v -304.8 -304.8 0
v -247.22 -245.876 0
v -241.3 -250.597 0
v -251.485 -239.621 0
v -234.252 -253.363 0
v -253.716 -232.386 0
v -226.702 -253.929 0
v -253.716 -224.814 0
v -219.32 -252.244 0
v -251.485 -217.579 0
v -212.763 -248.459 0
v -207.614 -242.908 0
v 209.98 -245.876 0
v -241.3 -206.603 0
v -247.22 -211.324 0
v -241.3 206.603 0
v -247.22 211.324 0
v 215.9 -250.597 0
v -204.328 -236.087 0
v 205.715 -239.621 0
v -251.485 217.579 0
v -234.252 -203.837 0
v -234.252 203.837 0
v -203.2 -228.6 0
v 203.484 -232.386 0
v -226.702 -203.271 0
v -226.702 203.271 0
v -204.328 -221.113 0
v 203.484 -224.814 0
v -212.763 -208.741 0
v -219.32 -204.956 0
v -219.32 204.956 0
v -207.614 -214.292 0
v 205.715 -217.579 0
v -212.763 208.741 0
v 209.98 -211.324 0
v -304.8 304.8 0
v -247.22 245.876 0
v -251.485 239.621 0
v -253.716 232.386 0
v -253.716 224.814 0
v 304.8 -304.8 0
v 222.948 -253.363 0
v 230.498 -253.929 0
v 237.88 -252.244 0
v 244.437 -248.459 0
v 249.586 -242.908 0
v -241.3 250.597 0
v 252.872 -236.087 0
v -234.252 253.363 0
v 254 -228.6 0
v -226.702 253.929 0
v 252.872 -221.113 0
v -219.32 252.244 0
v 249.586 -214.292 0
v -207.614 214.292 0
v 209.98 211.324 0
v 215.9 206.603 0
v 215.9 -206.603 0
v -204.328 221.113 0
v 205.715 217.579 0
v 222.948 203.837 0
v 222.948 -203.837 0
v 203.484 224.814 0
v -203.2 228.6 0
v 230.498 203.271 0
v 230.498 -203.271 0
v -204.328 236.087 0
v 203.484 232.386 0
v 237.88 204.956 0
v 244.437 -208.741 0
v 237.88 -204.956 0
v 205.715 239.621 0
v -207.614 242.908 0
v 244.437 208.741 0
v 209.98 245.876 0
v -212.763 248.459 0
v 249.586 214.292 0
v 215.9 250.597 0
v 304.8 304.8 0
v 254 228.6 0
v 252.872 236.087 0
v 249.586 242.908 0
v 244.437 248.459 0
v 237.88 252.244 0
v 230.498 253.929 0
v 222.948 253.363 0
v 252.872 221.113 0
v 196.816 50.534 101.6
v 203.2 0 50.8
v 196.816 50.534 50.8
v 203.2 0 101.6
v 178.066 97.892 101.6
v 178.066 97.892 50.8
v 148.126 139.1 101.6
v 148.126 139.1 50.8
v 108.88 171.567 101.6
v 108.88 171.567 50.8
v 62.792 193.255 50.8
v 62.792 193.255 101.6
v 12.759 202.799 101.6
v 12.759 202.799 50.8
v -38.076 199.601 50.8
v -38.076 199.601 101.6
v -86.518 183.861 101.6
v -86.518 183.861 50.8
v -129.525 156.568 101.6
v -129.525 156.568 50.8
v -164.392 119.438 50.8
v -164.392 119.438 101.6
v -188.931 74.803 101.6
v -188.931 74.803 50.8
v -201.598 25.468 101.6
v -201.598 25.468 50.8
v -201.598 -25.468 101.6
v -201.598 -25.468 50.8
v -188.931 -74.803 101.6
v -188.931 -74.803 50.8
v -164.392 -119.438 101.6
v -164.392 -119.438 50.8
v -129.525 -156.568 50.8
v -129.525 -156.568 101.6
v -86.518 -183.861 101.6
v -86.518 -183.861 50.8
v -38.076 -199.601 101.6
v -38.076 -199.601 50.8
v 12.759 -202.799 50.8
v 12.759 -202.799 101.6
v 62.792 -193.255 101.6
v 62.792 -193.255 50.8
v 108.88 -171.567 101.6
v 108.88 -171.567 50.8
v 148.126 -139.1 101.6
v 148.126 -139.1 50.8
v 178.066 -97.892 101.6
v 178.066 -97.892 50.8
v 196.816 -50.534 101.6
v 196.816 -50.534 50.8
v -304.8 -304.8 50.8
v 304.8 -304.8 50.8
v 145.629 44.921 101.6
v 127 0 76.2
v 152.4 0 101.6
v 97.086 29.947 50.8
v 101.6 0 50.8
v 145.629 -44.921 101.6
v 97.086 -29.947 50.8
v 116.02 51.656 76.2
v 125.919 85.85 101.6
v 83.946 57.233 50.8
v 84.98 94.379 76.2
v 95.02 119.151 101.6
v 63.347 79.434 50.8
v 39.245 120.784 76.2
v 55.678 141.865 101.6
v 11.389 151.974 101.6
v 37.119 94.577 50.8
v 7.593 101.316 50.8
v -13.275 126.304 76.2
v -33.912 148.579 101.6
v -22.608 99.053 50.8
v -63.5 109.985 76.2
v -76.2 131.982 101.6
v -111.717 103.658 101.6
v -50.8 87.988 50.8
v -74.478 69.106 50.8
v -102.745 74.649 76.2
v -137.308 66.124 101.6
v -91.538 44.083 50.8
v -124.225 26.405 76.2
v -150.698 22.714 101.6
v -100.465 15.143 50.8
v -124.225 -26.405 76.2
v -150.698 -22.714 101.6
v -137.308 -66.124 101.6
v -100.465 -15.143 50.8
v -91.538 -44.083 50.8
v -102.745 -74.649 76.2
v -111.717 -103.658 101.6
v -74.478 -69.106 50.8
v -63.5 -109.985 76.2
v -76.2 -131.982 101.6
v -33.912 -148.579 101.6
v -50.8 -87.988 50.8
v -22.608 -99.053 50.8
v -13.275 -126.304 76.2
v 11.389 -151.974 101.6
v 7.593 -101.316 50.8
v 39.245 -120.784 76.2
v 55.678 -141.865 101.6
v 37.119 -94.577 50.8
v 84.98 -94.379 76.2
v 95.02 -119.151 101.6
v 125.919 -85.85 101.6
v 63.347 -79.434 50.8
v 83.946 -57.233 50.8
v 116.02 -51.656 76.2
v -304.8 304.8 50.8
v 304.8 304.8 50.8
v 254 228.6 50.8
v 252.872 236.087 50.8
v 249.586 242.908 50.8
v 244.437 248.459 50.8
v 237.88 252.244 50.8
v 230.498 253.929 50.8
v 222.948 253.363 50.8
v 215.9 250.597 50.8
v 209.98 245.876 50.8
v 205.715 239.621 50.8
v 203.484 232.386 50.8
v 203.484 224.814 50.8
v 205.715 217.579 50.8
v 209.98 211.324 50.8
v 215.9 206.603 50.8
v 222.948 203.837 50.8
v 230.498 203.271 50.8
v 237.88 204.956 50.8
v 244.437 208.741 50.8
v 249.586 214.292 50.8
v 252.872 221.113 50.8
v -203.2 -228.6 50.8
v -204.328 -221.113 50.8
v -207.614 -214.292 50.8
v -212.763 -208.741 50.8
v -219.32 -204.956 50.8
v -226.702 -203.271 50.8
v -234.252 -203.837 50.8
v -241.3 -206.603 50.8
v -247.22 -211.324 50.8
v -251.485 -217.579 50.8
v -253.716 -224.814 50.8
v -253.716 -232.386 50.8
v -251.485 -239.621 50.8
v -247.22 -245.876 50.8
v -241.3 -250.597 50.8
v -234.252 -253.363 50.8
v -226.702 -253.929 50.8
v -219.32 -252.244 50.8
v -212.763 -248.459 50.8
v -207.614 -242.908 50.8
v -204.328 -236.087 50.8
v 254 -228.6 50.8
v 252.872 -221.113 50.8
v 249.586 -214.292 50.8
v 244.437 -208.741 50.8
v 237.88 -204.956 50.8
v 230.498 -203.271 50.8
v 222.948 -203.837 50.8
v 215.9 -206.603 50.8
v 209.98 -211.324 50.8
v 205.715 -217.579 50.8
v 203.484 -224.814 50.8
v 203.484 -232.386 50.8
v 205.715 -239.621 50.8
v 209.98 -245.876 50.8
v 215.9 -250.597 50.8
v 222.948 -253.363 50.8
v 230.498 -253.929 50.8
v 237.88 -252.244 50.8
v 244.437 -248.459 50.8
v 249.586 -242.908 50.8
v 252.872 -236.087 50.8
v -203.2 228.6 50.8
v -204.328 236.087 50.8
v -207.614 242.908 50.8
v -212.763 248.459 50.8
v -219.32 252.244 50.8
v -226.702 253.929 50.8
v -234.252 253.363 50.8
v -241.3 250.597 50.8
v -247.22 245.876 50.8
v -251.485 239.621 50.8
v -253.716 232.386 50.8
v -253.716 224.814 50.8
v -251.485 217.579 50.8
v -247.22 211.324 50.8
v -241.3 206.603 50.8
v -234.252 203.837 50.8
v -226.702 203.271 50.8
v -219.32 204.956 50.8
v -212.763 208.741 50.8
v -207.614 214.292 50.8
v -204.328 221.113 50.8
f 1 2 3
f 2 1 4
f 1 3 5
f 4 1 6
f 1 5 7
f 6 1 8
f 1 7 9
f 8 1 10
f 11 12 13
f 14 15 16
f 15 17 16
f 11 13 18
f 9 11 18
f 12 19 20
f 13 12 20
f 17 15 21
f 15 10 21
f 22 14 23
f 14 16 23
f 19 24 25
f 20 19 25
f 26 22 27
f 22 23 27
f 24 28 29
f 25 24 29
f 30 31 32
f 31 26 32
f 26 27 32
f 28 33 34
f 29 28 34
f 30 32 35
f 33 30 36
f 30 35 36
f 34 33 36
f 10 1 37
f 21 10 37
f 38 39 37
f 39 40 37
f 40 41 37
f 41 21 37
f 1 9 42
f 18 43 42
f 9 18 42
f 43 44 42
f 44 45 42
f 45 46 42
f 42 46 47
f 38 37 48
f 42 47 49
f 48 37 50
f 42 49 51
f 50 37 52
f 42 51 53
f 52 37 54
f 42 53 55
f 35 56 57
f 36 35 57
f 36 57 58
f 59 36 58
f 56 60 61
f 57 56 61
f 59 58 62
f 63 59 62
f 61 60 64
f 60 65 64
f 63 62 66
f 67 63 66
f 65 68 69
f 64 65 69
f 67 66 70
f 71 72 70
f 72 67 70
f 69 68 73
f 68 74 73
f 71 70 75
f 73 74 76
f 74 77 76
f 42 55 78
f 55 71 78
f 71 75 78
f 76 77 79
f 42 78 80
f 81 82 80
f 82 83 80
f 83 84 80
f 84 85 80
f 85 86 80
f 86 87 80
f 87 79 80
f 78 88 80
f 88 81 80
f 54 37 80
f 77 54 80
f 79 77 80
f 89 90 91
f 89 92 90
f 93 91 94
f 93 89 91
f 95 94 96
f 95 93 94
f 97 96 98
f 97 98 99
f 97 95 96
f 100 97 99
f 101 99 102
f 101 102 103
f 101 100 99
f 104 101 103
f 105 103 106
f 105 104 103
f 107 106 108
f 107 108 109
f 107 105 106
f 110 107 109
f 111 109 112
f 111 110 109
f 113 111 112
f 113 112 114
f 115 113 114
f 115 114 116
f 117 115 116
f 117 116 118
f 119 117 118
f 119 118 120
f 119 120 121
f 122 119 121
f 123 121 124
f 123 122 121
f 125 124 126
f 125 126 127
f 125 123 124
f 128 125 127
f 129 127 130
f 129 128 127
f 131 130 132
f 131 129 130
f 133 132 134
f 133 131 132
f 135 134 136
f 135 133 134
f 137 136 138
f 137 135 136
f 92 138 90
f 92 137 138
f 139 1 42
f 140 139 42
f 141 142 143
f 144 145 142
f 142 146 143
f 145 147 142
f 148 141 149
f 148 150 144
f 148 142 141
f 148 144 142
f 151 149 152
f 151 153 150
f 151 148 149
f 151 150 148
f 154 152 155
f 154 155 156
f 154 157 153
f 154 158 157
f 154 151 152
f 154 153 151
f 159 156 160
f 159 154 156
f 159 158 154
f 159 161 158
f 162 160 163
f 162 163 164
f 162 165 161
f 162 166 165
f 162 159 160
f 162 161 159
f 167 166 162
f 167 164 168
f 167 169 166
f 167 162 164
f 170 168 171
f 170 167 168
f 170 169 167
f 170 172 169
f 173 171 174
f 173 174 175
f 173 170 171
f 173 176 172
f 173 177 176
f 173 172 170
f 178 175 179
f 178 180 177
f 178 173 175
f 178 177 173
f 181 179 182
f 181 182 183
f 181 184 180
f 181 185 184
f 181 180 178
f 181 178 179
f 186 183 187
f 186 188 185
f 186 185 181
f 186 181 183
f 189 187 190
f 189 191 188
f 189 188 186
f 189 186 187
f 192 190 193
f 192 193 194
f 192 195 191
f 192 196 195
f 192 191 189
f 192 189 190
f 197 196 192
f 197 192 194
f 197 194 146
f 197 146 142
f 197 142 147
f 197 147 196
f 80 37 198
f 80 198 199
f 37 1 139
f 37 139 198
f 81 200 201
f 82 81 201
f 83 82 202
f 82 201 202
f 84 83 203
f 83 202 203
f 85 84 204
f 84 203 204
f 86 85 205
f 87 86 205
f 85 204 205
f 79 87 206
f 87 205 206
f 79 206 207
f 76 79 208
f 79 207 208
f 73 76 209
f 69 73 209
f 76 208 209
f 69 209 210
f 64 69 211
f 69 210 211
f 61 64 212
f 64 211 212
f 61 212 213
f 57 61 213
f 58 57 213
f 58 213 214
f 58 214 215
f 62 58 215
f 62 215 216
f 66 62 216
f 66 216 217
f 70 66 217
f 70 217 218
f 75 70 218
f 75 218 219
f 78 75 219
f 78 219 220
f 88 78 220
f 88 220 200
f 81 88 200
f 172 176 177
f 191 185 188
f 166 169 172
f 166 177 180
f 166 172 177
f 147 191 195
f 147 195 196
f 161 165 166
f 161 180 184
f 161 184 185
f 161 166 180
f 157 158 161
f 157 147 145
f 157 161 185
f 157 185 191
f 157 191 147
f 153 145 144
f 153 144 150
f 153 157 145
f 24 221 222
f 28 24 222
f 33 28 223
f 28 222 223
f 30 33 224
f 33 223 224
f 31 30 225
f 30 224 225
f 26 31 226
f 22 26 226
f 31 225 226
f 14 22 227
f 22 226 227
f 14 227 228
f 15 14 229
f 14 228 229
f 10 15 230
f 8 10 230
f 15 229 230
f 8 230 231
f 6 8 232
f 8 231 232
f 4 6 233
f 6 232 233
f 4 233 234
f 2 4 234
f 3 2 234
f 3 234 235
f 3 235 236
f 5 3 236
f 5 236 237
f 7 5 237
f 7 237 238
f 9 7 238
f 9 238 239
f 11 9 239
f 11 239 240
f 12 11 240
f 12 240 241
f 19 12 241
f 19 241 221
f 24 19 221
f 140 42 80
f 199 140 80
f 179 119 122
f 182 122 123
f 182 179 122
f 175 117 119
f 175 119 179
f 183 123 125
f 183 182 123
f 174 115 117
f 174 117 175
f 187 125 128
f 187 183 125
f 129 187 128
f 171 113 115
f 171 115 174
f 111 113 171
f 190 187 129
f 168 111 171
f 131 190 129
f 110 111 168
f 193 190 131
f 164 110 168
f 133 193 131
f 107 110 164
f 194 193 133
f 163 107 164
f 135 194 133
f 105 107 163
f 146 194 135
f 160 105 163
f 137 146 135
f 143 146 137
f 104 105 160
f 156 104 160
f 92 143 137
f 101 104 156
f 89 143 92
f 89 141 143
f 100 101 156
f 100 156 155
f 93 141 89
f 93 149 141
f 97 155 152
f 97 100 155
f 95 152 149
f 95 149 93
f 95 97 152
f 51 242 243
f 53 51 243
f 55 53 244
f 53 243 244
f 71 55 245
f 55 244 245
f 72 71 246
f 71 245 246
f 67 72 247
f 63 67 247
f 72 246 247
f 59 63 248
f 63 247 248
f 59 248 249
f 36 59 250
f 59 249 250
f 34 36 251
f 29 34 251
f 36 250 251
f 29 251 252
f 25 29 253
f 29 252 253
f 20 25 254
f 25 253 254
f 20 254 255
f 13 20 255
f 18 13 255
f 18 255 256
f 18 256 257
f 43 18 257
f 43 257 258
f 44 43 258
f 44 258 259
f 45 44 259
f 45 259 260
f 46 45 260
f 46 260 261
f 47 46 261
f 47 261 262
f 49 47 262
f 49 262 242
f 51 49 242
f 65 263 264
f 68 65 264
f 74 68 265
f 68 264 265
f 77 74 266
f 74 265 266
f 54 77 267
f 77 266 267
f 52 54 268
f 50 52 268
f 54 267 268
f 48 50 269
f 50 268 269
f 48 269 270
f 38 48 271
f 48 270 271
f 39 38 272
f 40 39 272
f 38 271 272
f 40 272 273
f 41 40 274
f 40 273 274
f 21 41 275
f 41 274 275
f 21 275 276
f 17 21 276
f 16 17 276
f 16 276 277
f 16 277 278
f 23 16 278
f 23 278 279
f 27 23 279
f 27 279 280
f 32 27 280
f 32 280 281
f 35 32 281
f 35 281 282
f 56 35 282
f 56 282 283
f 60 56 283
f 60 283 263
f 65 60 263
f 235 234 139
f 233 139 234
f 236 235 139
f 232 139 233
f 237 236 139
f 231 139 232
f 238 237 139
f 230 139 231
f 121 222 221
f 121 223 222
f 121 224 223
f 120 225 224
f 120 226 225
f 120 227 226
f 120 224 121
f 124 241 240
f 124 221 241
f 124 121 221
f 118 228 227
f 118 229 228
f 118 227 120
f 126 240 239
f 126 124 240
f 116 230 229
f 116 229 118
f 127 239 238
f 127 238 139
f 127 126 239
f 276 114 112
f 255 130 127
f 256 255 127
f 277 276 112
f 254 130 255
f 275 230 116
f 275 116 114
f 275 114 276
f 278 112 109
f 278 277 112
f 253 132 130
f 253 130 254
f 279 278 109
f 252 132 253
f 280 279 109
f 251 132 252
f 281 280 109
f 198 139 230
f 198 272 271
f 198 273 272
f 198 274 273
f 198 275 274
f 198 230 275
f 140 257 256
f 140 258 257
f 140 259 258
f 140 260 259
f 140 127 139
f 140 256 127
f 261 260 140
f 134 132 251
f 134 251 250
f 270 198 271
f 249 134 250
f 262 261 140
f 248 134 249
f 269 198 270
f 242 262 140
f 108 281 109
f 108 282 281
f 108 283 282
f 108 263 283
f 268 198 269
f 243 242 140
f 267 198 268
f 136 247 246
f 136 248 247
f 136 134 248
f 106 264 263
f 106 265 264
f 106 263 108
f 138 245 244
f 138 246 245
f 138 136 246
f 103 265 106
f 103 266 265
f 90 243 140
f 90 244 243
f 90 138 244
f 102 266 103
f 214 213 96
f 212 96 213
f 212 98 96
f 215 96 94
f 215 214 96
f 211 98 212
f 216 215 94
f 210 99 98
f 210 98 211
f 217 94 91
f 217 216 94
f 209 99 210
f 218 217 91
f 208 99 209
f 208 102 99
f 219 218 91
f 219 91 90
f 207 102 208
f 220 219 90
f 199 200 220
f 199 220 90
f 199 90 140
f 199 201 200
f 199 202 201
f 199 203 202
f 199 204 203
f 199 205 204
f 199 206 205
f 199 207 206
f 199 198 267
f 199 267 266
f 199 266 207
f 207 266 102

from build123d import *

# Parameters (mm, degrees)
F0_W     = 609.6
F0_H     = 609.6
F1_DEPTH = 50.8
F4_R     = 25.4
F5_DEPTH = 50.801


with BuildPart() as f1:
    # F0 (on Top) → F1 (new body)
    with BuildSketch(Plane.XY):
        Rectangle(F0_W, F0_H)
    extrude(amount=F1_DEPTH)

    # F2 (on Front) → F3 (revolve)
    with BuildSketch(Plane.XZ):
        Polygon((152.4, 101.6), (101.6, 50.8), (203.2, 50.8), (203.2, 101.6), align=None)
    revolve(axis=Axis((0, 0, 25.4), (0, 0, 1)))

    # F4 (on face) → F5 (cut, through all)
    with BuildSketch(Plane.XY.offset(50.8)):
        with Locations((-228.6, 228.6)):
            Circle(F4_R)
        with Locations((228.6, 228.6)):
            Circle(F4_R)
        with Locations((228.6, -228.6)):
            Circle(F4_R)
        with Locations((-228.6, -228.6)):
            Circle(F4_R)
    extrude(amount=-F5_DEPTH, mode=Mode.SUBTRACT)


solid = f1.part
